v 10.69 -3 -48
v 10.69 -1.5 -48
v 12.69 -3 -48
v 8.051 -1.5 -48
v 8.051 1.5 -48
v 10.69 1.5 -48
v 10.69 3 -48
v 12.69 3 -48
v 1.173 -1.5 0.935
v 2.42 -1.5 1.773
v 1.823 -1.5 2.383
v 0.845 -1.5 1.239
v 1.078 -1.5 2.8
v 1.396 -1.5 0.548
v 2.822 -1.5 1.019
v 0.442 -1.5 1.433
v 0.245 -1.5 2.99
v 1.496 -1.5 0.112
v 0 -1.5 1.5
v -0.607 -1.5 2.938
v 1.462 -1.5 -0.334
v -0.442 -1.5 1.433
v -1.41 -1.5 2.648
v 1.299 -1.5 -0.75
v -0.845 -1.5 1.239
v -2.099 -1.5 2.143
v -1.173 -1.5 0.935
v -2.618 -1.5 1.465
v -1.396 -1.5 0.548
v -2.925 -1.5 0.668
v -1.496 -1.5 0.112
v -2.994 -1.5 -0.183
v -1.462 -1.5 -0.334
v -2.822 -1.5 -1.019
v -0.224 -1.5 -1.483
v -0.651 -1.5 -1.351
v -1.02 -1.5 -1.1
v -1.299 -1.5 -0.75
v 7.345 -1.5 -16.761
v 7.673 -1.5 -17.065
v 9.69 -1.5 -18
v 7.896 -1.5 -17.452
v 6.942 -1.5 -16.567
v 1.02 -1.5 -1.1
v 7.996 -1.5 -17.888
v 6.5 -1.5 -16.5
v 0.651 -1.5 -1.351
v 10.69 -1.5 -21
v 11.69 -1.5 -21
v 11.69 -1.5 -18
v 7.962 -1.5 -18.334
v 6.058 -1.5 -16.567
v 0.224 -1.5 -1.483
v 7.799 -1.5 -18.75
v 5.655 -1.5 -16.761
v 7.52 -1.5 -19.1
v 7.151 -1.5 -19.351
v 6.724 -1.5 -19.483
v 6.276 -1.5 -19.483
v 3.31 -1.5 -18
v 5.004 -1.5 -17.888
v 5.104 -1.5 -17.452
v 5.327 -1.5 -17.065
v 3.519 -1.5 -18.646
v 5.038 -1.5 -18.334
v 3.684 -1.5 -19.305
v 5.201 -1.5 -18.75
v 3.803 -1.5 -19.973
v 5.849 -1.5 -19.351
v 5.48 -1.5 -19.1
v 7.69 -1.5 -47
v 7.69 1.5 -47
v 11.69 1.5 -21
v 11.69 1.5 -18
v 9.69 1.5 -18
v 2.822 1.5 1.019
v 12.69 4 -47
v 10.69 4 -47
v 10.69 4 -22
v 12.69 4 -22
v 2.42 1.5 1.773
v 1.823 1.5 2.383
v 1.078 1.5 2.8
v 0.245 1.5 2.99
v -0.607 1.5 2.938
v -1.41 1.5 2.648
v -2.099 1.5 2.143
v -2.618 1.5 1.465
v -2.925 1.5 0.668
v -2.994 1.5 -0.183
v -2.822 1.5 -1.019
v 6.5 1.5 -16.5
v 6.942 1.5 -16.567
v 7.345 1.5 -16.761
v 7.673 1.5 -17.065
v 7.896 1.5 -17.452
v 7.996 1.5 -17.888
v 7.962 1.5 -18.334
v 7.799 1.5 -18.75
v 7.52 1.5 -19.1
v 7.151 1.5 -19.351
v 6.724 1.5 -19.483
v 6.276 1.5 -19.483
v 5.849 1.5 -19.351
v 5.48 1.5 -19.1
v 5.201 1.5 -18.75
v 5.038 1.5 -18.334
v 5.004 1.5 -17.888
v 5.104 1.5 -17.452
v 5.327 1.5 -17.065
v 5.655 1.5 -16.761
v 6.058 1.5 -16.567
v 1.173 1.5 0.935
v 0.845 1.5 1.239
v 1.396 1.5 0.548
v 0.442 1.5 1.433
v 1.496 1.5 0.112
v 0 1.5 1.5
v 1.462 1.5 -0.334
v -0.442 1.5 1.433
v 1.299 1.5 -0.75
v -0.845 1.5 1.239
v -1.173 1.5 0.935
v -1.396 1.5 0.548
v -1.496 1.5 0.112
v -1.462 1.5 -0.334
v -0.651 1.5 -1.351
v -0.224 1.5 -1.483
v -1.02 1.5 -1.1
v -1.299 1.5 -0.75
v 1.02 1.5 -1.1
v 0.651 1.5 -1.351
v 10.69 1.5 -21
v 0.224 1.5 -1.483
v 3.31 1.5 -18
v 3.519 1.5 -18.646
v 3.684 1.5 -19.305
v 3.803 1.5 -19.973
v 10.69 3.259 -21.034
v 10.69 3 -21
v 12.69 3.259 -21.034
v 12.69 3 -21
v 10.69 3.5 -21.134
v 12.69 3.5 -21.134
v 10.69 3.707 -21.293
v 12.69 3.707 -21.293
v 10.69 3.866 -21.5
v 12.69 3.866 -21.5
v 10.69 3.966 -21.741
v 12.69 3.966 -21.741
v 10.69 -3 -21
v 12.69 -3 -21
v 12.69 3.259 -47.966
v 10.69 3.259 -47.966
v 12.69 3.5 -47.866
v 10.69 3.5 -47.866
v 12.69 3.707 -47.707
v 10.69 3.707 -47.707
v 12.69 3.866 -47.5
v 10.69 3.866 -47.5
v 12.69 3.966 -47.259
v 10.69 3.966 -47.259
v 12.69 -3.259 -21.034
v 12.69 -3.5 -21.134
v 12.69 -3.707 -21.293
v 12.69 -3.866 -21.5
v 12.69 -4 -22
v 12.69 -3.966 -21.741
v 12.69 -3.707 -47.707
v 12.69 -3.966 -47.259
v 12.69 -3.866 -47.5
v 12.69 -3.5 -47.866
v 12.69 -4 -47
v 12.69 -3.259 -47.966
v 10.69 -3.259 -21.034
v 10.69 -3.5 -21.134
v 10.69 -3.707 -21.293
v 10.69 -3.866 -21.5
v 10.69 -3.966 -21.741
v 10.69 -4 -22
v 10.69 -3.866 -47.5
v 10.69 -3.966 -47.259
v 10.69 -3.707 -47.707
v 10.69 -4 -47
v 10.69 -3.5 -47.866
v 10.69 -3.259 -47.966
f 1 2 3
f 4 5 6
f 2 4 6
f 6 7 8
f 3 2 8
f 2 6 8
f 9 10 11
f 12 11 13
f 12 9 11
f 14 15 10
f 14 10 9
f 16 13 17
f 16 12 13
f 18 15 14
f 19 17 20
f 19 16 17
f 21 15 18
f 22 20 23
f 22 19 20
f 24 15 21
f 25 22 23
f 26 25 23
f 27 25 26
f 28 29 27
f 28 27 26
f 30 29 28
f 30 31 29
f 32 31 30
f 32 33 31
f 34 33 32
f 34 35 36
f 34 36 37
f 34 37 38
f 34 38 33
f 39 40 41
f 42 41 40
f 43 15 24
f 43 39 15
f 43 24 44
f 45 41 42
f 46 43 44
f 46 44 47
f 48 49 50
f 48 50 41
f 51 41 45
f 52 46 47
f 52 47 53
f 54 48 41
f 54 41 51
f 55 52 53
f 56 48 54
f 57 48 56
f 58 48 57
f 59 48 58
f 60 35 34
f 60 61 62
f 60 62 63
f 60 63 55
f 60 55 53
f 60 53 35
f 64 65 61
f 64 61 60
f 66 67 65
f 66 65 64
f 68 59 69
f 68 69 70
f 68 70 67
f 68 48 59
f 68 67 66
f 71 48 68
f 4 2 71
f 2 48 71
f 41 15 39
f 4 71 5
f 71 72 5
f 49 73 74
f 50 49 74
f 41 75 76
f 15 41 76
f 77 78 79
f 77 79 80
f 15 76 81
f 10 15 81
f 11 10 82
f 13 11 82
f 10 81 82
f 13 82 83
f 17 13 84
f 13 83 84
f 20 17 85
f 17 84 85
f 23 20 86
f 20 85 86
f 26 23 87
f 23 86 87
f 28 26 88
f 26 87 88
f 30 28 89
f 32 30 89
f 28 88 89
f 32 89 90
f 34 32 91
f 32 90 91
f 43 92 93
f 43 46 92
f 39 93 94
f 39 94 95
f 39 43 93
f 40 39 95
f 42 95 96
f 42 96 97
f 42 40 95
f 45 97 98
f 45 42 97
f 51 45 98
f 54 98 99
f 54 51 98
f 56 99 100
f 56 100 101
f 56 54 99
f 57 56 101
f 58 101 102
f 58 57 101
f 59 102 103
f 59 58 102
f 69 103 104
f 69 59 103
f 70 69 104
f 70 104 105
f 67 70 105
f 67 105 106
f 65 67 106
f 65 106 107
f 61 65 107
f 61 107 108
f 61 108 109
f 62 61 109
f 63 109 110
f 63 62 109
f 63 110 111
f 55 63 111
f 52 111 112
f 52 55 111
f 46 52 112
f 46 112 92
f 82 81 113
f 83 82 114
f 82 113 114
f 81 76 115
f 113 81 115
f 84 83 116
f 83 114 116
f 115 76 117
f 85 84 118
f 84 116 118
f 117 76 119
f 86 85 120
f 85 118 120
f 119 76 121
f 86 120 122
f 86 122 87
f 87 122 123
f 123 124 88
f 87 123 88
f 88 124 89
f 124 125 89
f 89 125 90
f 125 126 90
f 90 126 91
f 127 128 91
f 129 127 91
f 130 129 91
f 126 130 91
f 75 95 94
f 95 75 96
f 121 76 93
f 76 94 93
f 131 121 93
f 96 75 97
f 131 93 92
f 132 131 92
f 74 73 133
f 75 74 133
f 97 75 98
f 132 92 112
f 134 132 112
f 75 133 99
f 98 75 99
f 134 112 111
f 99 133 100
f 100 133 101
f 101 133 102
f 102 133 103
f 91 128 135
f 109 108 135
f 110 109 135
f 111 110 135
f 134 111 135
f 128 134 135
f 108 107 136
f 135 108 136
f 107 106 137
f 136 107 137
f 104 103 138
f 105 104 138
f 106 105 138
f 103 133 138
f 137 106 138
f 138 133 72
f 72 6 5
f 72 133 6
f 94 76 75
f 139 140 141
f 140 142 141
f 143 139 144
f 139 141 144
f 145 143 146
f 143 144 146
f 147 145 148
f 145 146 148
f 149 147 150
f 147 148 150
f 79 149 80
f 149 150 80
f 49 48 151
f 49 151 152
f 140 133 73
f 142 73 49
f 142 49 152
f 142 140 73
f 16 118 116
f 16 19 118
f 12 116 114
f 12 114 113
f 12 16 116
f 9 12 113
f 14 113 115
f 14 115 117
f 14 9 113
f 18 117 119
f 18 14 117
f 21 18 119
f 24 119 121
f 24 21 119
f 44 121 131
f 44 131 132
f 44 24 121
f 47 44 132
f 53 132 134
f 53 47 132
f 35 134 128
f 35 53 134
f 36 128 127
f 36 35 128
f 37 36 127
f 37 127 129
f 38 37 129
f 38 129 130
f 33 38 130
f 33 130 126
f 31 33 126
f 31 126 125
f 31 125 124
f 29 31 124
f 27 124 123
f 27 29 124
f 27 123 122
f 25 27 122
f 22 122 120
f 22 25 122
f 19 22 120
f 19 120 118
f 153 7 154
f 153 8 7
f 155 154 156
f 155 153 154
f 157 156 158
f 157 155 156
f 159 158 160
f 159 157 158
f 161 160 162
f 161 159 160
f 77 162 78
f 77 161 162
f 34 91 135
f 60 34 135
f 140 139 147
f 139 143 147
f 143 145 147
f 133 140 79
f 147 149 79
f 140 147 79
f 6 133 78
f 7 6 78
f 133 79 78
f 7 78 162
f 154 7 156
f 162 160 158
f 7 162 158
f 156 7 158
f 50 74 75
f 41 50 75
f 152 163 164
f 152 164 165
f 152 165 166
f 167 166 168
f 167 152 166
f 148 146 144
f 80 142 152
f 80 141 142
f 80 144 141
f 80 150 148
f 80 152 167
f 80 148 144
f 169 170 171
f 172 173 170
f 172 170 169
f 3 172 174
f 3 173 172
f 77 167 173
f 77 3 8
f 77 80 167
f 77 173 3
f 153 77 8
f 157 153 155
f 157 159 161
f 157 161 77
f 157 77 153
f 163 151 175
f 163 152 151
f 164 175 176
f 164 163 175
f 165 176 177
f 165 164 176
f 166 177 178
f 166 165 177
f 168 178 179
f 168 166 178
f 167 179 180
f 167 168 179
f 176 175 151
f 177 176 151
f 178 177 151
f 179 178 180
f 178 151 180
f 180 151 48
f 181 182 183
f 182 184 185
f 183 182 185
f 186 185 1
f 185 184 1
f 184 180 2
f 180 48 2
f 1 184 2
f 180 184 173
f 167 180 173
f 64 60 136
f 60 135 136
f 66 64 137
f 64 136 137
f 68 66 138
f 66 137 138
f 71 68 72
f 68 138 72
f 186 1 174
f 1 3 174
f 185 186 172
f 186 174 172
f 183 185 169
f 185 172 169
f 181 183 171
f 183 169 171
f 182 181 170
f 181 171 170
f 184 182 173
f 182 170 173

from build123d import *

# Parameters (mm, degrees)
SKETCH1_R           = 1.5
BOSS_EXTRUDE1_DEPTH = 1.5
SKETCH3_W           = 2
SKETCH3_H           = 27
BOSS_EXTRUDE2_DEPTH = 4
FILLET1_R           = 1


with BuildPart() as part:
    # Sketch1 → Boss-Extrude1 (new, symmetric)
    with BuildSketch(Plane(origin=(0, 0, 0), x_dir=(1, 0, 0), z_dir=(0, 1, 0))):
        with BuildLine():
            Line((-2.821661699, 1.018933391), (3.310390132, 18))
            ThreePointArc((3.310390132, 18), (3.606995734, 18.973968595), (3.803029904, 19.973048328))
            Line((3.803029904, 19.973048328), (7.689609868, 47))
            Line((7.689609868, 47), (8.050720979, 48))
            Line((8.050720979, 48), (11.689609868, 48))
            Line((11.689609868, 48), (11.689609868, 18))
            Line((11.689609868, 18), (9.689609868, 18))
            Line((9.689609868, 18), (2.821661699, -1.018933391))
            ThreePointArc((2.821661699, -1.018933391), (-1.018933391, -2.821661699), (-2.821661699, 1.018933391))
        make_face()
        with Locations(Location((6.5, 18, 0), (0, 0, 270))):
            Circle(SKETCH1_R, mode=Mode.SUBTRACT)
        with Locations(Location((0, 0, 0), (0, 0, 270))):
            Circle(SKETCH1_R, mode=Mode.SUBTRACT)
    extrude(amount=BOSS_EXTRUDE1_DEPTH, both=True)

    # Sketch3 → Boss-Extrude2 (add, symmetric)
    with BuildSketch(Plane(origin=(0, 0, 0), x_dir=(1, 0, 0), z_dir=(0, 1, 0))):
        with Locations((11.689609868, 34.5)):
            Rectangle(SKETCH3_W, SKETCH3_H)
    extrude(amount=BOSS_EXTRUDE2_DEPTH, both=True)

    # Fillet1
    fillet1_edges = [part.edges().sort_by_distance(p)[0] for p in [
        (11.689609868, -4, -48),
        (11.689609868, -4, -21),
        (11.689609868, 4, -48),
        (11.689609868, 4, -21),
    ]]
    fillet(fillet1_edges, radius=FILLET1_R)


solid = part.part
